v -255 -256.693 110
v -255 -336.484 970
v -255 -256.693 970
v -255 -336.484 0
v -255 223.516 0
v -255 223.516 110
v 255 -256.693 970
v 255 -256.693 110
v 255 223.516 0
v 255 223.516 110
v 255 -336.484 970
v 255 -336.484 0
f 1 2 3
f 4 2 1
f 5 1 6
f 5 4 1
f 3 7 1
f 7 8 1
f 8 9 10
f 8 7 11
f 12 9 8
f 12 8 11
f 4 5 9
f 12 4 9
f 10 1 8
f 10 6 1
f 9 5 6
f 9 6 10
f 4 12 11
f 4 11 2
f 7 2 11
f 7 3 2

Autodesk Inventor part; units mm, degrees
ref_plane "YZ Plane" through (0, 0, 0) normal (1, 0, 0) x (0, 1, 0)
ref_plane "XZ Plane" through (0, 0, 0) normal (0, 1, 0) x (-1, 0, 0)
ref_plane "XY Plane" through (0, 0, 0) normal (0, 0, 1) x (1, 0, 0)
ref_plane "Work Plane1" through (0, 0, 0) normal (0, 0, 1) x (1, 0, 0)
sketch "Sketch1" plane through (0, 0, 0) normal (0, 0, 1) x (1, 0, 0)
  line L0 (255, -336.4839) -> (-255, -336.4839)
  line L1 (-255, -336.4839) -> (-255, 223.5161)
  line L2 (-255, 223.5161) -> (255, 223.5161)
  line L3 (255, 223.5161) -> (255, -336.4839)
  line L4 (255, -336.4839) -> (-255, 223.5161) construction
  line L5 (-255, -336.4839) -> (255, 223.5161) construction
  point P0 (0, -56.4839)
  dimension "d0" = 510
  dimension "d1" = 560
extrude "Extrusion1" add sketch "Sketch1" along normal blind 110
sketch "Sketch2" plane through (0, 0, 110) normal (0, 0, 1) x (1, 0, 0)
  line L0 (-255, -336.4839) -> (255, -336.4839) projected
  line L1 (255, -336.4839) -> (255, 223.5161) projected
  line L2 (-255, -336.4839) -> (255, -336.4839)
  line L3 (255, -336.4839) -> (255, -256.6929)
  line L4 (255, -256.6929) -> (-255, -256.6929)
  line L5 (-255, -256.6929) -> (-255, -336.4839)
  point P0 (0, 0)
extrude "Extrusion2" add sketch "Sketch2" along normal blind 860
properties part number "fotel"
